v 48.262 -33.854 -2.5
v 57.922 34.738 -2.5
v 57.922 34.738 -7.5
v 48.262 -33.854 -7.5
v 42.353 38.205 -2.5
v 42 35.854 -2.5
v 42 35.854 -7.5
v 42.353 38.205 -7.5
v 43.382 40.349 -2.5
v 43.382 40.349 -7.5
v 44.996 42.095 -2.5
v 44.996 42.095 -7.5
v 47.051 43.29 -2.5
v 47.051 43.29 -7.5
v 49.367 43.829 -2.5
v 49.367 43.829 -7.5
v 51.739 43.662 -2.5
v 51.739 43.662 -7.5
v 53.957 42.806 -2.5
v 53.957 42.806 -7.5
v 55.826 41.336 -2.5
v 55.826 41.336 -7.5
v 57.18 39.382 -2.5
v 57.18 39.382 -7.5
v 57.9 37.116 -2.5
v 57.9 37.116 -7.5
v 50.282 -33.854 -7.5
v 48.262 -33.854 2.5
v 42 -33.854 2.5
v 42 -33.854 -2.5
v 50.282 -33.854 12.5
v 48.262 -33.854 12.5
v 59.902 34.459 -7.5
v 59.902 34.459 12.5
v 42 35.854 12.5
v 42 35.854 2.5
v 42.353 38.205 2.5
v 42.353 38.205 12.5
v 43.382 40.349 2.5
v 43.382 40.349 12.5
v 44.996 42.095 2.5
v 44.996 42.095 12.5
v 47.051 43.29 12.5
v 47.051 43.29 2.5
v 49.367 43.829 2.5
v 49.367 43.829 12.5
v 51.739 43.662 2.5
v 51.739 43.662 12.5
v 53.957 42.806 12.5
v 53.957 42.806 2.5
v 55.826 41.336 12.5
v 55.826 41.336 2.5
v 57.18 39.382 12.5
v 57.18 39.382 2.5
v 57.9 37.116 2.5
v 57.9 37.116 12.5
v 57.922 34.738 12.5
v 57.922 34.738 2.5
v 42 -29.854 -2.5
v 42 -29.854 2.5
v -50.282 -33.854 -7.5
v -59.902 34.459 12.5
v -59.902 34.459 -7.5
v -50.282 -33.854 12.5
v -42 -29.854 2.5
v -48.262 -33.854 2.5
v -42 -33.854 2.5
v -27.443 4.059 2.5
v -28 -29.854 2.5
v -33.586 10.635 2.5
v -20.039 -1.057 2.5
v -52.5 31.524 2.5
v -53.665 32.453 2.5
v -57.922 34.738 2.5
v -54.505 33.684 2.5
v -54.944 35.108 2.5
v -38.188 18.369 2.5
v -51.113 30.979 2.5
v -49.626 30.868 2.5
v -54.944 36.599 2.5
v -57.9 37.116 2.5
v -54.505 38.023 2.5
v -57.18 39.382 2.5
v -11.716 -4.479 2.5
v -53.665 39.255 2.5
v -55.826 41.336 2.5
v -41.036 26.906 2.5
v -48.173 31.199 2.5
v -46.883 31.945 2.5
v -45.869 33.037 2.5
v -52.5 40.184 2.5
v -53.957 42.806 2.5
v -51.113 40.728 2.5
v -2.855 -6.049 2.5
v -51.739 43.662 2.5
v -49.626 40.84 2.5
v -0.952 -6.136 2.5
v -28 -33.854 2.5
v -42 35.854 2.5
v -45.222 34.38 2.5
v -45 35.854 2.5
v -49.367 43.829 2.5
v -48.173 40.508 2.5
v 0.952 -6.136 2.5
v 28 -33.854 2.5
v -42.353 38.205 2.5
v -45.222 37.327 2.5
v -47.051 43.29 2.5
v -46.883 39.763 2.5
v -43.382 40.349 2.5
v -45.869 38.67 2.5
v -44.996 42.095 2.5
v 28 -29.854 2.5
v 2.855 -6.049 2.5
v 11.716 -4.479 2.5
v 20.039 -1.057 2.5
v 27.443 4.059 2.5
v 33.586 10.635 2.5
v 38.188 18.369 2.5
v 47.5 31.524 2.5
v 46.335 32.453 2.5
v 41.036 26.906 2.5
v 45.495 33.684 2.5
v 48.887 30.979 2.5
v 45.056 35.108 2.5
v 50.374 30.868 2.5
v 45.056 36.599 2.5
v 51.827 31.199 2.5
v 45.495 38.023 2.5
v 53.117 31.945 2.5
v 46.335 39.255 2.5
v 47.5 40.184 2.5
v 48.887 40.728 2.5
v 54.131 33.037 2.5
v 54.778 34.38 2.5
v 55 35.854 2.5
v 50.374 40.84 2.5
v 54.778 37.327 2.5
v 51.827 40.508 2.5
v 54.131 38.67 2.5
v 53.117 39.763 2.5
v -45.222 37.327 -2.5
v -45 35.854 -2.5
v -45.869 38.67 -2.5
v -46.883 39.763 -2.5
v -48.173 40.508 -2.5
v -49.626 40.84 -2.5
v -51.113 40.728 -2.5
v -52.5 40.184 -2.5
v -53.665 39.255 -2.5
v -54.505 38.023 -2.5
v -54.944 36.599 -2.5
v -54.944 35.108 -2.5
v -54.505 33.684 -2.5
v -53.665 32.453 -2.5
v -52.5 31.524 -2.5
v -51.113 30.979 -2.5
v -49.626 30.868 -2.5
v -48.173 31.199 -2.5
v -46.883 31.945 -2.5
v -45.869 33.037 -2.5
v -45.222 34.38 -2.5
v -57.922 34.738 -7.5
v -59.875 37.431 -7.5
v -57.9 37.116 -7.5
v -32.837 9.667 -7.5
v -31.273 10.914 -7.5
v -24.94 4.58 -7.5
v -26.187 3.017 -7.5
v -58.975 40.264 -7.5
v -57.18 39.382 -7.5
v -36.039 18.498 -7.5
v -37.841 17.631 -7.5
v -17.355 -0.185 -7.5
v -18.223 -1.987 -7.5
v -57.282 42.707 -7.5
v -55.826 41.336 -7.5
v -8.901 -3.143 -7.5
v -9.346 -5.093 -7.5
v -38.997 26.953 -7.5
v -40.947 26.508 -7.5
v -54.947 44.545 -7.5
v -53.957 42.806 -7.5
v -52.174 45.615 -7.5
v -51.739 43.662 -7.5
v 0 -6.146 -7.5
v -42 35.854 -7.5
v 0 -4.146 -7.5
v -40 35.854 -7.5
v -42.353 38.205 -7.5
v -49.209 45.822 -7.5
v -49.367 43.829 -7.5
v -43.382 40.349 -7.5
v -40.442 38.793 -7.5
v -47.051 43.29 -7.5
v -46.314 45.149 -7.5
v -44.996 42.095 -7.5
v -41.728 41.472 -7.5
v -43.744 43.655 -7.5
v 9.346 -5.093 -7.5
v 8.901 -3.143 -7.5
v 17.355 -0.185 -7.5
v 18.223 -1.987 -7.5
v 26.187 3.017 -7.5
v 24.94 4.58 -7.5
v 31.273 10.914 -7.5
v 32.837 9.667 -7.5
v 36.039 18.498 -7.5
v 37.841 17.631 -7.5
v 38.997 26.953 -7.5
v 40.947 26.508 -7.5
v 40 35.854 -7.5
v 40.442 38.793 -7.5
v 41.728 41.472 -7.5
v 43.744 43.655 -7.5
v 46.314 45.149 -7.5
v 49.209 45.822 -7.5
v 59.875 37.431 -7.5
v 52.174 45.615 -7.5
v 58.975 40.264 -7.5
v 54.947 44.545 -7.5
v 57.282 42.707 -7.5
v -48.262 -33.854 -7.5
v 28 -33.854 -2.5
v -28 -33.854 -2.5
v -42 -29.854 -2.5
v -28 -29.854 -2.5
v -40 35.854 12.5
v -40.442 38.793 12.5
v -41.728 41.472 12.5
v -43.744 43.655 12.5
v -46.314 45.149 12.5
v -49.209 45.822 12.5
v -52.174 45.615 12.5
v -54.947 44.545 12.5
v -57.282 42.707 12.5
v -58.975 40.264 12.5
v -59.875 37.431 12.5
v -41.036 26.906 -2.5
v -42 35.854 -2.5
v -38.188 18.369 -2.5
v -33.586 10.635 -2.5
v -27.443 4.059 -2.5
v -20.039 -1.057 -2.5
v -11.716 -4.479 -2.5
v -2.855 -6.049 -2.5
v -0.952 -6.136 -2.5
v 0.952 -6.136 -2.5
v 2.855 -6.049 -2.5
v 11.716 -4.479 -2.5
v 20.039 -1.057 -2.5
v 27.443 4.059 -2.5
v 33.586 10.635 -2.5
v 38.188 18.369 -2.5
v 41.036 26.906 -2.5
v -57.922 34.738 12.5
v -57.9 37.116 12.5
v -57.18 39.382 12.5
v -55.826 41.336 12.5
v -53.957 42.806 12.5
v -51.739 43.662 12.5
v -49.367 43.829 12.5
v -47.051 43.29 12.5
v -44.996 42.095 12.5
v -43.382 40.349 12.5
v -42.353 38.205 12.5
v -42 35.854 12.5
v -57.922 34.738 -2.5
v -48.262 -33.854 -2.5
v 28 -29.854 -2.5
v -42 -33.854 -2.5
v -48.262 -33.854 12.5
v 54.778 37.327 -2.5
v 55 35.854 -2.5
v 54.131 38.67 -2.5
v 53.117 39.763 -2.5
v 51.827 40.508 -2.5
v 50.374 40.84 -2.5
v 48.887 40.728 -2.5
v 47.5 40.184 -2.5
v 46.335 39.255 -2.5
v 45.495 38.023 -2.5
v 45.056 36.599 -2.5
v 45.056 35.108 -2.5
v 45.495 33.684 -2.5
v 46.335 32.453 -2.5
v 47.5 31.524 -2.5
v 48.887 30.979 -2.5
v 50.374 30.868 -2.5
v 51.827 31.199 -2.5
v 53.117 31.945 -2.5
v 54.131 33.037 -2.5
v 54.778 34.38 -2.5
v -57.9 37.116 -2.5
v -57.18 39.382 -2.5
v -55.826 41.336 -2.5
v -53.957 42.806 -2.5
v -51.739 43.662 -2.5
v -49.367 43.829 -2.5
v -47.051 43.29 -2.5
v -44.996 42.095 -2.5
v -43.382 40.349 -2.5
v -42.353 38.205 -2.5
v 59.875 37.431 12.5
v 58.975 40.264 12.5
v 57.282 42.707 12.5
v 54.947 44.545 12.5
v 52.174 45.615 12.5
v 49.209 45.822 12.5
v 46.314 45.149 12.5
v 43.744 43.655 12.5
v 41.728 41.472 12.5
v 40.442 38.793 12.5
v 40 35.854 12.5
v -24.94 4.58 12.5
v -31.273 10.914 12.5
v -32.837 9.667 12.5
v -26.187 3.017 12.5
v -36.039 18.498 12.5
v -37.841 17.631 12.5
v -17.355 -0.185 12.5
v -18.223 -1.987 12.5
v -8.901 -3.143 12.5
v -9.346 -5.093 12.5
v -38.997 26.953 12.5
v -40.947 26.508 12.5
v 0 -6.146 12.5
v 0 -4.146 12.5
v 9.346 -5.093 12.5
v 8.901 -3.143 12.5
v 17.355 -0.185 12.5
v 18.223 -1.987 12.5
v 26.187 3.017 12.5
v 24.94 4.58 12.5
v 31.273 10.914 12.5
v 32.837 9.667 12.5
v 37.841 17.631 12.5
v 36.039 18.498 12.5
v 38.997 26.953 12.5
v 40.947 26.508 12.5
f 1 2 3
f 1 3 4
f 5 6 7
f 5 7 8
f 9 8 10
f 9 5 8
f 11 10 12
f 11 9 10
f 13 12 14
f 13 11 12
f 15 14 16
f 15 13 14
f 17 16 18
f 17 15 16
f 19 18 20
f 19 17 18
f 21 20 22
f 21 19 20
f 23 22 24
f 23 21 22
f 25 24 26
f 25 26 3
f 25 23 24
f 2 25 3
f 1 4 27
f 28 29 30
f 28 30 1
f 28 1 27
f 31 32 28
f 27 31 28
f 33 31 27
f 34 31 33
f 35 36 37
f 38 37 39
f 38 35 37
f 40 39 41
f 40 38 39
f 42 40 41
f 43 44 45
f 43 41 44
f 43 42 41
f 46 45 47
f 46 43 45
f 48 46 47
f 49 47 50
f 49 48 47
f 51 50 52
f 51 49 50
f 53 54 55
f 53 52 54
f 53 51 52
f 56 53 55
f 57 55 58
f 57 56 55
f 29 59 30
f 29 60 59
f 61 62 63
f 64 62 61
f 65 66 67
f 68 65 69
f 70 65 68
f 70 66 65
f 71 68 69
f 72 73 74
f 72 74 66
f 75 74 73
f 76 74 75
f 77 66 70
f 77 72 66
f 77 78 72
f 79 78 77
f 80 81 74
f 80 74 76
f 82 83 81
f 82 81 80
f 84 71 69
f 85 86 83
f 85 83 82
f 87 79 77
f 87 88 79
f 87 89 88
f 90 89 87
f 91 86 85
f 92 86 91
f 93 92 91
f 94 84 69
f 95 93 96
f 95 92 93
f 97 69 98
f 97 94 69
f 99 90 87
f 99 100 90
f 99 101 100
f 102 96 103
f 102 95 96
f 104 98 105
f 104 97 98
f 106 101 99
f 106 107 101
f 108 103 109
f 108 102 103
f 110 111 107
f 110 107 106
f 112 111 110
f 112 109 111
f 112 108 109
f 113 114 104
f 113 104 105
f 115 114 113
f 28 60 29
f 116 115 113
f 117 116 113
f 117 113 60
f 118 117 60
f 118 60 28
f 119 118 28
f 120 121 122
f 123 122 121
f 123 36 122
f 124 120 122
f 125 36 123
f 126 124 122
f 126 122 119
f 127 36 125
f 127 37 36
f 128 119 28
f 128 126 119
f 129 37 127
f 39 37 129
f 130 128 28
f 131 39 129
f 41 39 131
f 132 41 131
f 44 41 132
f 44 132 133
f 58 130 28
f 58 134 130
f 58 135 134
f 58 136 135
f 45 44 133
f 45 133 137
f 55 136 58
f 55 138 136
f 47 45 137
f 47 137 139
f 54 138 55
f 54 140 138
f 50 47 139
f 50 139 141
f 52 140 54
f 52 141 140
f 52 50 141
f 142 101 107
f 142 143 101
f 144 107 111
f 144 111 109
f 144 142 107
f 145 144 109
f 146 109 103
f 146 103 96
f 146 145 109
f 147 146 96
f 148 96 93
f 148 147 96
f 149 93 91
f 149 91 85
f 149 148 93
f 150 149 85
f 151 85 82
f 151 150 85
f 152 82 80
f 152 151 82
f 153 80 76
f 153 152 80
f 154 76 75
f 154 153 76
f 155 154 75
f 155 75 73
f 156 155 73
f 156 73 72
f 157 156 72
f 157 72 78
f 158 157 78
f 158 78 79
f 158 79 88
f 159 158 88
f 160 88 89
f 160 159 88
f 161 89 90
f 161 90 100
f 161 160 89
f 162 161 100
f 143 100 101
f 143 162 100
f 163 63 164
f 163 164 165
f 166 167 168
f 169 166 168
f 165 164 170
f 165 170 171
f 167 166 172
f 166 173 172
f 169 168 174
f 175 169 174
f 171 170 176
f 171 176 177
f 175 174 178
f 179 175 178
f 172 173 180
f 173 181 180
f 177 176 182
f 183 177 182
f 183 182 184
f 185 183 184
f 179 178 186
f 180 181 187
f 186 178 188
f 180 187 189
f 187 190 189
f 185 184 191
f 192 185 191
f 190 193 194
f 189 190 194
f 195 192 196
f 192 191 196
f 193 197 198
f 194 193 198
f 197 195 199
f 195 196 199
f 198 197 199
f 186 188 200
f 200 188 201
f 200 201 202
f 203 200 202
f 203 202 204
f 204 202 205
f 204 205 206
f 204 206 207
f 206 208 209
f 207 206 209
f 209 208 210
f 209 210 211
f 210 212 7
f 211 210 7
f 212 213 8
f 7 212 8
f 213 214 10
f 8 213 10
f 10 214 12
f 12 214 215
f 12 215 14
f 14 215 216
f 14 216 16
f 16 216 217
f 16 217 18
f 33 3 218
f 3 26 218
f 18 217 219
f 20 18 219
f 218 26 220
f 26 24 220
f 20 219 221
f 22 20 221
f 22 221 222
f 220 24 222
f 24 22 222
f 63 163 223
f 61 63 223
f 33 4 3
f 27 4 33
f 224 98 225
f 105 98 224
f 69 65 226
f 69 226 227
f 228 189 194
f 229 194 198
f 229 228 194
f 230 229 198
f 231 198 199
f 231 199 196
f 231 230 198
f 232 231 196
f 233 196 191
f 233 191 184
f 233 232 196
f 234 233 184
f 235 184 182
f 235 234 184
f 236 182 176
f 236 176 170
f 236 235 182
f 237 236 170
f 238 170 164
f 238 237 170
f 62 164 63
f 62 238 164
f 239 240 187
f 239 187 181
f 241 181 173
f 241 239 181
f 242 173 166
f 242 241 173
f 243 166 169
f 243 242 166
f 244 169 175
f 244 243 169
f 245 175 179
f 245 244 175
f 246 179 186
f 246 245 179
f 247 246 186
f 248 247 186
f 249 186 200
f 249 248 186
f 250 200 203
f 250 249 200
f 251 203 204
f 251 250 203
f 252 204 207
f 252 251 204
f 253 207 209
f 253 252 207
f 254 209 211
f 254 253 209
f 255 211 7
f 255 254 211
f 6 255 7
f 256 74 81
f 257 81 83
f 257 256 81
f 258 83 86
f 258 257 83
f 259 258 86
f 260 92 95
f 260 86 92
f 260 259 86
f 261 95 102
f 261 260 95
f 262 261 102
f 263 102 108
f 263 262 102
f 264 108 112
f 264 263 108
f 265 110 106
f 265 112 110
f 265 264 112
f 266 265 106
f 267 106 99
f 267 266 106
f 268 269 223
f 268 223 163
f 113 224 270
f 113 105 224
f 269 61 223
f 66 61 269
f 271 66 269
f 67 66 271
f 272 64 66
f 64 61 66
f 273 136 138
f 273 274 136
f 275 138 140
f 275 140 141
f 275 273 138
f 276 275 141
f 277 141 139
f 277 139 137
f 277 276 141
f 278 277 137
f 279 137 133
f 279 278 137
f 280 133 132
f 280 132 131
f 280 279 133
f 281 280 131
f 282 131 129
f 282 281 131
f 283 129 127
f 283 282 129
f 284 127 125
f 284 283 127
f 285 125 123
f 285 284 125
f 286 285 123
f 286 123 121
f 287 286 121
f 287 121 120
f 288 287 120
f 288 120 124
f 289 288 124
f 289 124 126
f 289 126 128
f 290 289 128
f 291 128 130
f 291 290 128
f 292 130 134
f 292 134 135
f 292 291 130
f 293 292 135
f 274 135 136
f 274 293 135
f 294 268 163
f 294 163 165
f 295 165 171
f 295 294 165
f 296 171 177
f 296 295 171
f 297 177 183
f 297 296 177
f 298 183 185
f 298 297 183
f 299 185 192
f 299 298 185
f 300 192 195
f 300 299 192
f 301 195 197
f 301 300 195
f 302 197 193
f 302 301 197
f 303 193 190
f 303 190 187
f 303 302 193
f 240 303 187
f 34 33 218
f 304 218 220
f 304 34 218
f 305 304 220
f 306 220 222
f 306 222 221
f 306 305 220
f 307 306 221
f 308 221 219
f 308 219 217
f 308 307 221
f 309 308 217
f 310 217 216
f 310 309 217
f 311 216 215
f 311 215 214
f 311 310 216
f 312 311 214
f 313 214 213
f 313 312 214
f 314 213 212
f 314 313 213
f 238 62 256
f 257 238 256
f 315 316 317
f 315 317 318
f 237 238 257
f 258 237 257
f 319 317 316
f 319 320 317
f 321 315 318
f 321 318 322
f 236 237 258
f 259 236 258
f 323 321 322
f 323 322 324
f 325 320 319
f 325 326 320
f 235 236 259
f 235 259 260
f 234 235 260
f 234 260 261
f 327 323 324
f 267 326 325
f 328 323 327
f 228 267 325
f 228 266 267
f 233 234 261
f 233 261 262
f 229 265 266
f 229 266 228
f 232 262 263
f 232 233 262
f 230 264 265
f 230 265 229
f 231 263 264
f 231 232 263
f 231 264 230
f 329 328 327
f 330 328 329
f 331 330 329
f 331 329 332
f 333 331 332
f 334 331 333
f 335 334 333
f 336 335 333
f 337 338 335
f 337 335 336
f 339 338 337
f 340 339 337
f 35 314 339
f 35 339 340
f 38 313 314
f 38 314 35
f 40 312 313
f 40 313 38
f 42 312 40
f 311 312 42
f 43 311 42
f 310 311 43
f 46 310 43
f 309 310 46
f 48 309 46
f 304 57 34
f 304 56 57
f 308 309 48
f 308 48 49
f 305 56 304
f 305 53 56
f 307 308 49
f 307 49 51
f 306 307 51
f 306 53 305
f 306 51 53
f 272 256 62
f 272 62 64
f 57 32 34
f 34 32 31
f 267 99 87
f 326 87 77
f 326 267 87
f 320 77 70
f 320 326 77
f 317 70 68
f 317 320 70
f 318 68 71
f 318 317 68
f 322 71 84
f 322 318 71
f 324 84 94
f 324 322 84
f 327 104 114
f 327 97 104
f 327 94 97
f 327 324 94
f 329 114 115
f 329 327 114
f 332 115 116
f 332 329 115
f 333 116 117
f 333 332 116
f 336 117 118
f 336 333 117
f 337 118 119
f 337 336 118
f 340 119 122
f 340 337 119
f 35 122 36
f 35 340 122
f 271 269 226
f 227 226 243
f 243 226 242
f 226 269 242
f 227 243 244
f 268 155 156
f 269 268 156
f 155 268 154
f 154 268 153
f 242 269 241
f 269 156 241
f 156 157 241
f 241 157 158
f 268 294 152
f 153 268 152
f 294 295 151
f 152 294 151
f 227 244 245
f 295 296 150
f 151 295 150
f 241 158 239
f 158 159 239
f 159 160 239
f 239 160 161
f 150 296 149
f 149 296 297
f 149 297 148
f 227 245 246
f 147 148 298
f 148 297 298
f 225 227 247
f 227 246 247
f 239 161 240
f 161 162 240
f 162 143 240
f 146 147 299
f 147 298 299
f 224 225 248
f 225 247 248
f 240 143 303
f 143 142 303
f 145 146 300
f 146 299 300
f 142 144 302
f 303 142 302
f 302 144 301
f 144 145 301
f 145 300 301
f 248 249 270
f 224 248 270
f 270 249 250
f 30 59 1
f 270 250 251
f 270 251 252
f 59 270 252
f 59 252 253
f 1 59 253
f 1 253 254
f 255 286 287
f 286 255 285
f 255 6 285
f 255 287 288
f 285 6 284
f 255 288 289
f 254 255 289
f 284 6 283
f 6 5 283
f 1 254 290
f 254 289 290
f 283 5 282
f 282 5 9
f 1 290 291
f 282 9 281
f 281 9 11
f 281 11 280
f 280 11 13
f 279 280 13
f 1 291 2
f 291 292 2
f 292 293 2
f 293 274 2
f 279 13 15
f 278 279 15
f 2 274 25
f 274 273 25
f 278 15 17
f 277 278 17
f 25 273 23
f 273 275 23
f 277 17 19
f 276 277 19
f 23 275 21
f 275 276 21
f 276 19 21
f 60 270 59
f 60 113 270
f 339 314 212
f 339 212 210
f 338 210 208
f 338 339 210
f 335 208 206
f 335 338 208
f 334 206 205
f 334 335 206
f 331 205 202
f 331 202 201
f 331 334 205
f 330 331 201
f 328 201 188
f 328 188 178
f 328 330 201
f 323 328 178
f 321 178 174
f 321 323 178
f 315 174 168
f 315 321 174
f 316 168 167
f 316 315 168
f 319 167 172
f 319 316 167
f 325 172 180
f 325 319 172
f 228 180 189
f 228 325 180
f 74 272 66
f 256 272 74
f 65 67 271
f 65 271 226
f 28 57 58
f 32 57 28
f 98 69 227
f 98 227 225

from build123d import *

# Parameters (mm, degrees)
F0_R     = 5
F1_DEPTH = 2.5
F3_DEPTH = 10


# Not quite as in the source:
# - a feature names something its author has since deleted; it is built from what else it names


with BuildPart() as f1:
    # F0 (on Top) → F1 (new body, symmetric)
    with BuildSketch(Plane.XY):
        with BuildLine():
            ThreePointArc((2.8545027599, -6.0492269011), (0, -6.146341392), (-2.8545027599, -6.0492269011))
            ThreePointArc((-2.8545027599, -6.0492269011), (-30.6911152935, 7.182149369), (-42, 35.853658608))
            ThreePointArc((-42, 35.853658608), (-50.5591908622, 43.8340912767), (-57.9218263949, 34.7380123518))
            Line((-57.9218263949, 34.7380123518), (-48.2619276413, -33.853658608))
            Line((-48.2619276413, -33.853658608), (-42, -33.853658608))
            Line((-42, -33.853658608), (-42, -29.853658608))
            Line((-42, -29.853658608), (-28, -29.853658608))
            Line((-28, -29.853658608), (-28, -33.853658608))
            Line((-28, -33.853658608), (28, -33.853658608))
            Line((28, -33.853658608), (28, -29.853658608))
            Line((28, -29.853658608), (42, -29.853658608))
            Line((42, -29.853658608), (42, -33.853658608))
            Line((42, -33.853658608), (48.2619276413, -33.853658608))
            Line((48.2619276413, -33.853658608), (57.9218263949, 34.7380123518))
            ThreePointArc((57.9218263949, 34.7380123518), (50.5591908622, 43.8340912767), (42, 35.853658608))
            ThreePointArc((42, 35.853658608), (30.6911152935, 7.182149369), (2.8545027599, -6.0492269011))
        make_face()
        with Locations((-50, 35.853658608)):
            Circle(F0_R, mode=Mode.SUBTRACT)
        with Locations((50, 35.853658608)):
            Circle(F0_R, mode=Mode.SUBTRACT)
    extrude(amount=F1_DEPTH, both=True)

    # F2 (on face) → F3 (join, symmetric)
    with BuildSketch(Plane.XY.offset(2.5)):
        with BuildLine():
            Line((48.2619276413, -33.853658608), (50.2816638994, -33.853658608))
            Line((50.2816638994, -33.853658608), (59.9022829936, 34.4591007877))
            ThreePointArc((59.9022829936, 34.4591007877), (50.6989885778, 45.8291994439), (40, 35.853658608))
            ThreePointArc((40, 35.853658608), (0, -4.146341392), (-40, 35.853658608))
            ThreePointArc((-40, 35.853658608), (-50.6989885778, 45.8291994439), (-59.9022829936, 34.4591007877))
            Line((-59.9022829936, 34.4591007877), (-50.2816638994, -33.853658608))
            Line((-50.2816638994, -33.853658608), (-48.2619276413, -33.853658608))
            Line((-48.2619276413, -33.853658608), (-57.9218263949, 34.7380123518))
            ThreePointArc((-57.9218263949, 34.7380123518), (-50.5591908622, 43.8340912767), (-42, 35.853658608))
            ThreePointArc((-42, 35.853658608), (0, -6.146341392), (42, 35.853658608))
            ThreePointArc((42, 35.853658608), (50.5591908622, 43.8340912767), (57.9218263949, 34.7380123518))
            Line((57.9218263949, 34.7380123518), (48.2619276413, -33.853658608))
        make_face()
    extrude(amount=F3_DEPTH, both=True)


solid = f1.part
